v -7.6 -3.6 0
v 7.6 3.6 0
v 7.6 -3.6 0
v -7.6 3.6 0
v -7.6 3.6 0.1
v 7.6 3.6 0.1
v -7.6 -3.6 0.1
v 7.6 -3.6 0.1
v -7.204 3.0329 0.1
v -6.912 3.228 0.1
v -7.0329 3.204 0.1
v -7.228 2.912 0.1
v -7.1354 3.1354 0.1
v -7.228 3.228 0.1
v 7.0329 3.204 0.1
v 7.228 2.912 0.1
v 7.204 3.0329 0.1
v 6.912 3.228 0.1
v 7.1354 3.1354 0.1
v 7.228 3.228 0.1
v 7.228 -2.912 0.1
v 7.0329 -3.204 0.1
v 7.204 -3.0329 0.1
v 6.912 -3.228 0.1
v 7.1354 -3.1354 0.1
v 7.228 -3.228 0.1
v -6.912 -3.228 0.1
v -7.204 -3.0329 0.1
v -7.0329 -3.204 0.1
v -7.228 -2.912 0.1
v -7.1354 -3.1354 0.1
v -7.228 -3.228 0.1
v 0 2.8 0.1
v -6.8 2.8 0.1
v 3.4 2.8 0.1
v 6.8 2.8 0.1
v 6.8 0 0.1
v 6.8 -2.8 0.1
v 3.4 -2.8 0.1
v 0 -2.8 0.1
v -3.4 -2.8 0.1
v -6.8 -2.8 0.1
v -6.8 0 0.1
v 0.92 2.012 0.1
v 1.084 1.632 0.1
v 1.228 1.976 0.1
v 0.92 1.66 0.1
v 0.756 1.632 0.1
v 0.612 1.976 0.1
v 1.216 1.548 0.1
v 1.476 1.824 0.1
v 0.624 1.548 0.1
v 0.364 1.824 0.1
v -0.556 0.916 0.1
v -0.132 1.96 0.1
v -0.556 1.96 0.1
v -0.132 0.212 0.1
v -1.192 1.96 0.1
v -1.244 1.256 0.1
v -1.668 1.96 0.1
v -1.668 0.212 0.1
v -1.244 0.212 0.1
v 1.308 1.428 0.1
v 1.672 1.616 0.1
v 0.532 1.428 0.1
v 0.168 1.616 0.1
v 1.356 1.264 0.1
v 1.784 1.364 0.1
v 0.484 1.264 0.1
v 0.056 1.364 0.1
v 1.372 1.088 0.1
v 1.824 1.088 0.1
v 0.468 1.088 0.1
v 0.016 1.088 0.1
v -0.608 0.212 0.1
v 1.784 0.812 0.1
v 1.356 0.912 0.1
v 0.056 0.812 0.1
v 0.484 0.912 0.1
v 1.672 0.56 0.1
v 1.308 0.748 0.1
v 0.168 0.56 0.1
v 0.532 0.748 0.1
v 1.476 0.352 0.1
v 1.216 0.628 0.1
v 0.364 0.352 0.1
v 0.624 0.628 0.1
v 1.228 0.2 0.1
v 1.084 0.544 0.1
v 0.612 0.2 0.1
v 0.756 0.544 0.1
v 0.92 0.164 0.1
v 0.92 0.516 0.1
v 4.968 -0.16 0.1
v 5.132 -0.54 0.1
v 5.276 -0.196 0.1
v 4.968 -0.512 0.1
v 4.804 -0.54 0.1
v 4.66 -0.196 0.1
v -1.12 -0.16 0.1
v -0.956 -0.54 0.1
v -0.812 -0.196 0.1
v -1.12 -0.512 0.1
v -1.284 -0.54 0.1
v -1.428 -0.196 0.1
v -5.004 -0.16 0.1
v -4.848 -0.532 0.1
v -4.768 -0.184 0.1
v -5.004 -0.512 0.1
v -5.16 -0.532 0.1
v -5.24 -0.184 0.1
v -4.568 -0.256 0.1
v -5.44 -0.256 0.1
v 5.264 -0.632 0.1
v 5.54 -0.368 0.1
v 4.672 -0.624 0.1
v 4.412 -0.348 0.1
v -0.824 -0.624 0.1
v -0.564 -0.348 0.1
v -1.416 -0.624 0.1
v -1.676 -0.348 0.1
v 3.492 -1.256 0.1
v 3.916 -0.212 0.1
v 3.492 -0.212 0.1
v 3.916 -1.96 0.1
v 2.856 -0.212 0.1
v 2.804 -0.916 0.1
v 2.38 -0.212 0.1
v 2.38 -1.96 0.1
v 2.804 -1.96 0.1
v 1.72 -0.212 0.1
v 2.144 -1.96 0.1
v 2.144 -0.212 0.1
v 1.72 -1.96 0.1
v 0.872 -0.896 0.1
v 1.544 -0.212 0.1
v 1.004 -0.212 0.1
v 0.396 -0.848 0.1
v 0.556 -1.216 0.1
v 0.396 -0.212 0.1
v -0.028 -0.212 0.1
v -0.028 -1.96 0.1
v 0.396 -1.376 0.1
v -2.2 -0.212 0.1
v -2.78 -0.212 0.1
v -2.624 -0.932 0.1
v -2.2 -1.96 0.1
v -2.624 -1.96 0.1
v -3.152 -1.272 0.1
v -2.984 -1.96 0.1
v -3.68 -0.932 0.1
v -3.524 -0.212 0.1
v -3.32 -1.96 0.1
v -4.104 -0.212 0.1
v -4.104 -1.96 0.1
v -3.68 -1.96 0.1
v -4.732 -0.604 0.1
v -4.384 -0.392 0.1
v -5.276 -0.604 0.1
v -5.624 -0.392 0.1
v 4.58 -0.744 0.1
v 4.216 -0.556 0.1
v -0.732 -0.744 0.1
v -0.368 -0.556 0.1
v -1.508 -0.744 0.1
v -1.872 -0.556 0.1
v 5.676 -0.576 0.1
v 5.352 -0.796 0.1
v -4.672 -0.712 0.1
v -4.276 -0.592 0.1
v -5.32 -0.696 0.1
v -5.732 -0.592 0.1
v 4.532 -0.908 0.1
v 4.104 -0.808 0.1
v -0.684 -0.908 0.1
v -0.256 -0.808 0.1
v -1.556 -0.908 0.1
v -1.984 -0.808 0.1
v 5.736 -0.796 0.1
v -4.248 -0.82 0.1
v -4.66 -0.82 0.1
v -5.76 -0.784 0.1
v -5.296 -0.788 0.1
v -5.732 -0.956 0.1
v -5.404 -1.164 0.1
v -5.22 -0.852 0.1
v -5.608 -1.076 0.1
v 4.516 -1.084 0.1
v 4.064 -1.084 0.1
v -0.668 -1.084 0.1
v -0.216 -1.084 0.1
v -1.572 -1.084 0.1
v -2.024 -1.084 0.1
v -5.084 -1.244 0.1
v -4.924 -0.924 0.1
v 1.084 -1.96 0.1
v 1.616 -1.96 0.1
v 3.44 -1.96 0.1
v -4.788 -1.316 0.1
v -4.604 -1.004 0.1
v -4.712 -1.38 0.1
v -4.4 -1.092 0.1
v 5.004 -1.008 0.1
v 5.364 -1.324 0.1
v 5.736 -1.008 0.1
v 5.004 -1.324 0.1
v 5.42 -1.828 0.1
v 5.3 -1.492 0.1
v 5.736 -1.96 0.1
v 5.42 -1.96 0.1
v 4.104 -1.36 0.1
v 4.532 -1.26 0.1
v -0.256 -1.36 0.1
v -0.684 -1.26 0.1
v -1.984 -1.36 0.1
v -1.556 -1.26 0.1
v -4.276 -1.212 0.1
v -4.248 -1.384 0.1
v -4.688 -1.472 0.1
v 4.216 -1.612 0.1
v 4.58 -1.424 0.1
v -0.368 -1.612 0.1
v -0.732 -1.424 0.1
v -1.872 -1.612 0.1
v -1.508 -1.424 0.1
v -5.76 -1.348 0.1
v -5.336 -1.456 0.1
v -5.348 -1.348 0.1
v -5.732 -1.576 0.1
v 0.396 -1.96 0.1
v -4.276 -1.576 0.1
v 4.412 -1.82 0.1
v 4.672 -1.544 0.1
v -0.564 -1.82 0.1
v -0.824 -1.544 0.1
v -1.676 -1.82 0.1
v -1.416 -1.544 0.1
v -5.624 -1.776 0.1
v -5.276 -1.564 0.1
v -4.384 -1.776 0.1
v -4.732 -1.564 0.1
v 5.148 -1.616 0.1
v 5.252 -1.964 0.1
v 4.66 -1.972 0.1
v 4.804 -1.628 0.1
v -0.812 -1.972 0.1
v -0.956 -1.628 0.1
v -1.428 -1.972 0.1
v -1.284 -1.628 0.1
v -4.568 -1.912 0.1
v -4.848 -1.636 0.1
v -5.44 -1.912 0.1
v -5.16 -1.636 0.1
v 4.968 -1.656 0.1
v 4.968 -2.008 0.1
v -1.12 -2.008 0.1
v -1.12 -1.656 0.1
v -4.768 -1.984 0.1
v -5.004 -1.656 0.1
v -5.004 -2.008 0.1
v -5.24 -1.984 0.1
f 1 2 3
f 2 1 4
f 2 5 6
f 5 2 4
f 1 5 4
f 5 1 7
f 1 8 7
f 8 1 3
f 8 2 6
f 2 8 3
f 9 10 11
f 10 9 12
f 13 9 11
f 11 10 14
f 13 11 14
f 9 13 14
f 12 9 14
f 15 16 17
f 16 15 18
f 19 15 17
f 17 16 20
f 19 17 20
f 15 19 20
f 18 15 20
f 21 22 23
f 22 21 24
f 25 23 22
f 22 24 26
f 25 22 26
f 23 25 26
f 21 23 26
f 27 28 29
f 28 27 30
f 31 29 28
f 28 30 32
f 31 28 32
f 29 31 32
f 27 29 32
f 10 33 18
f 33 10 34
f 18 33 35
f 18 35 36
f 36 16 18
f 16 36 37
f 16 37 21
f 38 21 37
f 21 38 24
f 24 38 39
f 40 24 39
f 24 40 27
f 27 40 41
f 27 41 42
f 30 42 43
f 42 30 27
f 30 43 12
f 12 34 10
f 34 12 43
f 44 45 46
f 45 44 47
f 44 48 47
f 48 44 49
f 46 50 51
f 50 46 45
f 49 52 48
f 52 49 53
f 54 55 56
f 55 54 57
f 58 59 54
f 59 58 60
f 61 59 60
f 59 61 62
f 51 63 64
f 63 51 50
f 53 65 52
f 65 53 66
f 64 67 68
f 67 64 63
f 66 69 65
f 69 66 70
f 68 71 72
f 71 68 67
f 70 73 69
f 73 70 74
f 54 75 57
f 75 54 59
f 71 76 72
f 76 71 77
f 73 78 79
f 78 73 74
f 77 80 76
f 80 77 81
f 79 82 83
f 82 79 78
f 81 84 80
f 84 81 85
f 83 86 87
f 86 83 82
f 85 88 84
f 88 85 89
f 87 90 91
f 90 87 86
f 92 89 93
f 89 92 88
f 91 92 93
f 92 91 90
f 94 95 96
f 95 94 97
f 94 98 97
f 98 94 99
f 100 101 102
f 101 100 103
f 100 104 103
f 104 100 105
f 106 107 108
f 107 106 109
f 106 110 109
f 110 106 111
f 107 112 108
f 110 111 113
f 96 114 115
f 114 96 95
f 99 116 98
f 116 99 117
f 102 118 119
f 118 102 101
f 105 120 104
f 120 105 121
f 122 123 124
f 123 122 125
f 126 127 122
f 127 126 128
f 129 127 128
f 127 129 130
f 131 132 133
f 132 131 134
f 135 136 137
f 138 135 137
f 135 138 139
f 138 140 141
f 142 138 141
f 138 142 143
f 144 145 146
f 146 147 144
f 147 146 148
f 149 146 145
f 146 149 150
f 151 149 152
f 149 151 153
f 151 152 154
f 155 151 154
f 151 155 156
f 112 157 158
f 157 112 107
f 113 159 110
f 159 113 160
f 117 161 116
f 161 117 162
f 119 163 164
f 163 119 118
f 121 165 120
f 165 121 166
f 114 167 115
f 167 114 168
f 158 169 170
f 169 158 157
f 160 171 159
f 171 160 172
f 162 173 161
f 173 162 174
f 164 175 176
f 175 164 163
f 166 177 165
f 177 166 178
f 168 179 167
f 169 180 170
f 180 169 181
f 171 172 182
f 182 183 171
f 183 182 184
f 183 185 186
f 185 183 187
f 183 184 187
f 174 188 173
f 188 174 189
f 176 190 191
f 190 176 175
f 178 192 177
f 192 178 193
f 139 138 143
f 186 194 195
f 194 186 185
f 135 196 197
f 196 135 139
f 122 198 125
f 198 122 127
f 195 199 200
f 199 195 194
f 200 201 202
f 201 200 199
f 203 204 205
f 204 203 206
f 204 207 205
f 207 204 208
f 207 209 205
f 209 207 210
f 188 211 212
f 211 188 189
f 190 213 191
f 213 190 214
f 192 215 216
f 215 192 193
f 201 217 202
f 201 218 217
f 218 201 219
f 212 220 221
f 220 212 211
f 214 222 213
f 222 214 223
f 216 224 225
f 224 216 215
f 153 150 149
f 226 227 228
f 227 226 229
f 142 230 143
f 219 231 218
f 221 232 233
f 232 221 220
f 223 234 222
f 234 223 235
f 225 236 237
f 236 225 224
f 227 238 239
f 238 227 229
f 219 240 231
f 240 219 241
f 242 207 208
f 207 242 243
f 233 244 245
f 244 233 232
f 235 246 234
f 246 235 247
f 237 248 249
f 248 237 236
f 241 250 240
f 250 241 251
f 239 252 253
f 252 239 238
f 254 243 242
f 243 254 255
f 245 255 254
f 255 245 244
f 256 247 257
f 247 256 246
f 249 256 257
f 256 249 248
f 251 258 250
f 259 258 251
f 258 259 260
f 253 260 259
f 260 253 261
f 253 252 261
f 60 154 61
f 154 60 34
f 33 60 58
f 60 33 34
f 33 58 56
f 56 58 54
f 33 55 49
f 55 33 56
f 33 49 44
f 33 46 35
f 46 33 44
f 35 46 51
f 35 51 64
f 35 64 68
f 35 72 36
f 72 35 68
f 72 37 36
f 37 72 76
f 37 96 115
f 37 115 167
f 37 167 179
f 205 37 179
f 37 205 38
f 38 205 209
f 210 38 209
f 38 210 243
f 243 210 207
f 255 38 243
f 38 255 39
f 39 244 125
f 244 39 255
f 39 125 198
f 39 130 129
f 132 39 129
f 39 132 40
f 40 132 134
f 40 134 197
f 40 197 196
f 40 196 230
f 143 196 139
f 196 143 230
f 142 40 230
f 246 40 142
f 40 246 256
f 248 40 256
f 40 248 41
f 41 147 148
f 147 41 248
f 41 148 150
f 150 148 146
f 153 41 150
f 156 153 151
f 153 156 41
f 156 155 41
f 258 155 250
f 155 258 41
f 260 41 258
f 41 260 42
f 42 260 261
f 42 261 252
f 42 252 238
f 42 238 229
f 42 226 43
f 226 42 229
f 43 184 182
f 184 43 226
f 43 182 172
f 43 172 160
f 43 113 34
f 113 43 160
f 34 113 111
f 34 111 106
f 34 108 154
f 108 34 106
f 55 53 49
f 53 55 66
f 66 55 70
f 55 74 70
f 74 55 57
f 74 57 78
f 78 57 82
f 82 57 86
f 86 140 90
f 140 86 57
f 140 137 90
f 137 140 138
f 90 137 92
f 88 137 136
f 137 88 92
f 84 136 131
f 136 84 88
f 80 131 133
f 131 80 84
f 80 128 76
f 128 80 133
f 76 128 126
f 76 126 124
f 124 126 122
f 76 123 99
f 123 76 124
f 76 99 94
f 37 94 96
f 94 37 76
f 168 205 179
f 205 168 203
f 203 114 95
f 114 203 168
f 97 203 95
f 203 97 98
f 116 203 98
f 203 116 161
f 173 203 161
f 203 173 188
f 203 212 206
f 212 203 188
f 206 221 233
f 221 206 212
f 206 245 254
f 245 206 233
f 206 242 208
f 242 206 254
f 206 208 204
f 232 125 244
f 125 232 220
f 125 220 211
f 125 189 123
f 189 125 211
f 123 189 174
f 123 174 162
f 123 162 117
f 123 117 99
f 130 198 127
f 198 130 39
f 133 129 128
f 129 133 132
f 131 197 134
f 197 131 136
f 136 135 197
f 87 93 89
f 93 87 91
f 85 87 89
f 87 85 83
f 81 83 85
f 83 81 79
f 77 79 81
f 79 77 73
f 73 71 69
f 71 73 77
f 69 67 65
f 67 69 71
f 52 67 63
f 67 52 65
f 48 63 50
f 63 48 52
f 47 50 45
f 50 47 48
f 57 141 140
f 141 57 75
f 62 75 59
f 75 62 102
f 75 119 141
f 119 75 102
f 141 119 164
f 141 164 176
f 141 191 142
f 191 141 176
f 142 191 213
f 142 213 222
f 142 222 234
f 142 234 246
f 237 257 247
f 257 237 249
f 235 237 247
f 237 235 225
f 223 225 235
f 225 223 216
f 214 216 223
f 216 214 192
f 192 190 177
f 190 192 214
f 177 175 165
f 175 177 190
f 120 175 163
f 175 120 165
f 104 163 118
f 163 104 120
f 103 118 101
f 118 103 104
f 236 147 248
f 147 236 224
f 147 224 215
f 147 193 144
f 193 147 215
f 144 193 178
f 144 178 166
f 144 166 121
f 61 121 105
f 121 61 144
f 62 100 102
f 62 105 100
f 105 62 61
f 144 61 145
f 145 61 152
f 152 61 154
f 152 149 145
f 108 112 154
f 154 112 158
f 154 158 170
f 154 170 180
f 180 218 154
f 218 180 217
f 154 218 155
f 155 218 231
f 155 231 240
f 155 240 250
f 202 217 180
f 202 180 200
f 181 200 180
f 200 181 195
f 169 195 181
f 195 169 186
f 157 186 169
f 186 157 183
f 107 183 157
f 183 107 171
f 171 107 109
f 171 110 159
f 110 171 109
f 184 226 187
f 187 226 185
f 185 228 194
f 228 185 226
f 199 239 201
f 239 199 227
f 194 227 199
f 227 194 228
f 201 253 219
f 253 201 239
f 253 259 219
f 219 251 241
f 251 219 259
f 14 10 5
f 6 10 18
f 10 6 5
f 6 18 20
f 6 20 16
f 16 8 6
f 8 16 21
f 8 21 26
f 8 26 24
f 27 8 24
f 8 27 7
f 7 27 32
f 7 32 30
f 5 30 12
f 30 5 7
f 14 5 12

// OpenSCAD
// file: ../p/1-4ndis.scad
use <../lib.scad>
function ldraw_lib__1_4ndis() = [
// 0 Disc Negative 0.25
// 0 Name: 1-4ndis.dat
// 0 Author: James Jessiman
// 0 !LDRAW_ORG Primitive UPDATE 2012-01
// 0 !LICENSE Licensed under CC BY 4.0 : see CAreadme.txt
// 
// 0 BFC CERTIFY CCW
  [0,"BFC","CERTIFY"],
  [0,"BFC","CCW"],
// 
// 0 !HISTORY 2002-03-23 [sbliss] Added BFC Statement
// 0 !HISTORY 2002-04-25 [PTadmin] Official Update 2002-02
// 0 !HISTORY 2007-06-22 [PTadmin] Header formatted for Contributor Agreement
// 0 !HISTORY 2008-07-01 [PTadmin] Official Update 2008-01
// 0 !HISTORY 2012-02-16 [Philo] Changed to CCW
// 0 !HISTORY 2012-03-30 [PTadmin] Official Update 2012-01
// 
// 
// 3 16 0.9239 0 0.3827 1 0 0 1 0 1
  [3,16,0.9239,0,0.3827,1,0,0,1,0,1],
// 3 16 0.7071 0 0.7071 0.9239 0 0.3827 1 0 1
  [3,16,0.7071,0,0.7071,0.9239,0,0.3827,1,0,1],
// 3 16 0.3827 0 0.9239 0.7071 0 0.7071 1 0 1
  [3,16,0.3827,0,0.9239,0.7071,0,0.7071,1,0,1],
// 3 16 0 0 1 0.3827 0 0.9239 1 0 1
  [3,16,0,0,1,0.3827,0,0.9239,1,0,1],
];
module ldraw_lib__1_4ndis(step=0, col=false, unit=2/5, alt=false, line=0.2, solid=!$preview)
    makepoly(ldraw_lib__1_4ndis(), step=step, col=col, unit=unit, alt=alt, line=line, solid=solid);
ldraw_lib__1_4ndis(line=0.2);
// file: ../p/1-4chrd.scad
use <../lib.scad>
function ldraw_lib__1_4chrd() = [
// 0 Chord 0.25
// 0 Name: 1-4chrd.dat
// 0 Author: Max Martin Richter [MMR1988]
// 0 !LDRAW_ORG Primitive UPDATE 2023-05
// 0 !LICENSE Licensed under CC BY 4.0 : see CAreadme.txt
// 
// 0 BFC CERTIFY CCW
  [0,"BFC","CERTIFY"],
  [0,"BFC","CCW"],
// 
// 0 !HISTORY 2004-04-22 [PTadmin] Official Update 2004-02
// 0 !HISTORY 2007-10-09 [PTadmin] Header formatted for Contributor Agreement
// 0 !HISTORY 2008-07-01 [PTadmin] Official Update 2008-01
// 0 !HISTORY 2012-08-02 [MMR1988] Re-creation with PrimGen2 and Rectifier
// 0 !HISTORY 2012-08-09 [PTadmin] Official Update 2012-02
// 0 !HISTORY 2023-10-27 [OrionP] Change author to MMR1988 from hafhead
// 0 !HISTORY 2023-10-31 [OrionP] Official Update 2023-05
// 
// 4 16 0.9239 0 0.3827 0.3827 0 0.9239 0 0 1 1 0 0
  [4,16,0.9239,0,0.3827,0.3827,0,0.9239,0,0,1,1,0,0],
// 3 16 0.7071 0 0.7071 0.3827 0 0.9239 0.9239 0 0.3827
  [3,16,0.7071,0,0.7071,0.3827,0,0.9239,0.9239,0,0.3827],
];
module ldraw_lib__1_4chrd(step=0, col=false, unit=2/5, alt=false, line=0.2, solid=!$preview)
    makepoly(ldraw_lib__1_4chrd(), step=step, col=col, unit=unit, alt=alt, line=line, solid=solid);
ldraw_lib__1_4chrd(line=0.2);
// file: ../p/box5-12.scad
use <../lib.scad>
function ldraw_lib__box5_12() = [
// 0 Box with 5 Faces without Any Edges
// 0 Name: box5-12.dat
// 0 Author: Chris Dee [cwdee]
// 0 !LDRAW_ORG Primitive UPDATE 2009-02
// 0 !LICENSE Licensed under CC BY 4.0 : see CAreadme.txt
// 
// 0 BFC CERTIFY CCW
  [0,"BFC","CERTIFY"],
  [0,"BFC","CCW"],
// 
// 0 !HISTORY 2009-09-03 [PTadmin] Official Update 2009-02
// 
// 
// 4 16 1 1 1 1 1 -1 -1 1 -1 -1 1 1
  [4,16,1,1,1,1,1,-1,-1,1,-1,-1,1,1],
// 4 16 -1 0 1 1 0 1 1 1 1 -1 1 1
  [4,16,-1,0,1,1,0,1,1,1,1,-1,1,1],
// 4 16 -1 0 -1 -1 0 1 -1 1 1 -1 1 -1
  [4,16,-1,0,-1,-1,0,1,-1,1,1,-1,1,-1],
// 4 16 1 0 -1 -1 0 -1 -1 1 -1 1 1 -1
  [4,16,1,0,-1,-1,0,-1,-1,1,-1,1,1,-1],
// 4 16 1 0 1 1 0 -1 1 1 -1 1 1 1
  [4,16,1,0,1,1,0,-1,1,1,-1,1,1,1],
// 0
];
module ldraw_lib__box5_12(step=0, col=false, unit=2/5, alt=false, line=0.2, solid=!$preview)
    makepoly(ldraw_lib__box5_12(), step=step, col=col, unit=unit, alt=alt, line=line, solid=solid);
ldraw_lib__box5_12(line=0.2);
// main file
use <../lib.scad>
use <../p/box5-12.scad>
use <s/197915bs01.scad>
function ldraw_lib__197915b() = [
// 0 Sticker  0.9 x  1.9 with Black "NO SMOKING" and Border
// 0 Name: 197915b.dat
// 0 Author: N. W. Perry [Plastikean]
// 0 !LDRAW_ORG Part UPDATE 2024-04
// 0 !LICENSE Licensed under CC BY 4.0 : see CAreadme.txt
// 
// 0 BFC CERTIFY CCW
  [0,"BFC","CERTIFY"],
  [0,"BFC","CCW"],
// 
// 0 !KEYWORDS Bricklink 5540stk01, Brickowl 584393, Rebrickable 197915, set 5540
// 
// 0 !HISTORY 2022-10-06 [RainbowDolphin] Subfiled pattern
// 0 !HISTORY 2024-05-28 [OrionP] Official Update 2024-04
// 
// 1 16 0 -.25 0 19 0 0 0 .25 0 0 0 9 box5-12.dat
  [1,16,0,-.25,0,19,0,0,0,.25,0,0,0,9, ldraw_lib__box5_12()],
// 
// 0 BFC NOCLIP
  [0,"BFC","NOCLIP"],
// 1 16 0 -.25 0 1 0 0 0 1 0 0 0 1 s\197915bs01.dat
  [1,16,0,-.25,0,1,0,0,0,1,0,0,0,1, ldraw_lib__s__197915bs01()],
// 0 BFC CLIP
  [0,"BFC","CLIP"],
// 
// 3 16 -18.07 -.25 8.07 -17.28 -.25 8.07 -19 -.25 9
  [3,16,-18.07,-.25,8.07,-17.28,-.25,8.07,-19,-.25,9],
// 4 16 -19 -.25 9 -17.28 -.25 8.07 17.28 -.25 8.07 19 -.25 9
  [4,16,-19,-.25,9,-17.28,-.25,8.07,17.28,-.25,8.07,19,-.25,9],
// 3 16 19 -.25 9 17.28 -.25 8.07 18.07 -.25 8.07
  [3,16,19,-.25,9,17.28,-.25,8.07,18.07,-.25,8.07],
// 3 16 19 -.25 9 18.07 -.25 8.07 18.07 -.25 7.28
  [3,16,19,-.25,9,18.07,-.25,8.07,18.07,-.25,7.28],
// 4 16 19 -.25 9 18.07 -.25 7.28 18.07 -.25 -7.28 19 -.25 -9
  [4,16,19,-.25,9,18.07,-.25,7.28,18.07,-.25,-7.28,19,-.25,-9],
// 3 16 19 -.25 -9 18.07 -.25 -7.28 18.07 -.25 -8.07
  [3,16,19,-.25,-9,18.07,-.25,-7.28,18.07,-.25,-8.07],
// 3 16 19 -.25 -9 18.07 -.25 -8.07 17.28 -.25 -8.07
  [3,16,19,-.25,-9,18.07,-.25,-8.07,17.28,-.25,-8.07],
// 4 16 19 -.25 -9 17.28 -.25 -8.07 -17.28 -.25 -8.07 -19 -.25 -9
  [4,16,19,-.25,-9,17.28,-.25,-8.07,-17.28,-.25,-8.07,-19,-.25,-9],
// 3 16 -19 -.25 -9 -17.28 -.25 -8.07 -18.07 -.25 -8.07
  [3,16,-19,-.25,-9,-17.28,-.25,-8.07,-18.07,-.25,-8.07],
// 3 16 -19 -.25 -9 -18.07 -.25 -8.07 -18.07 -.25 -7.28
  [3,16,-19,-.25,-9,-18.07,-.25,-8.07,-18.07,-.25,-7.28],
// 4 16 -19 -.25 -9 -18.07 -.25 -7.28 -18.07 -.25 7.28 -19 -.25 9
  [4,16,-19,-.25,-9,-18.07,-.25,-7.28,-18.07,-.25,7.28,-19,-.25,9],
// 3 16 -18.07 -.25 8.07 -19 -.25 9 -18.07 -.25 7.28
  [3,16,-18.07,-.25,8.07,-19,-.25,9,-18.07,-.25,7.28],
];
module ldraw_lib__197915b(step=0, col=false, unit=2/5, alt=false, line=0.2, solid=!$preview)
    makepoly(ldraw_lib__197915b(), step=step, col=col, unit=unit, alt=alt, line=line, solid=solid);
ldraw_lib__197915b(line=0.2);
